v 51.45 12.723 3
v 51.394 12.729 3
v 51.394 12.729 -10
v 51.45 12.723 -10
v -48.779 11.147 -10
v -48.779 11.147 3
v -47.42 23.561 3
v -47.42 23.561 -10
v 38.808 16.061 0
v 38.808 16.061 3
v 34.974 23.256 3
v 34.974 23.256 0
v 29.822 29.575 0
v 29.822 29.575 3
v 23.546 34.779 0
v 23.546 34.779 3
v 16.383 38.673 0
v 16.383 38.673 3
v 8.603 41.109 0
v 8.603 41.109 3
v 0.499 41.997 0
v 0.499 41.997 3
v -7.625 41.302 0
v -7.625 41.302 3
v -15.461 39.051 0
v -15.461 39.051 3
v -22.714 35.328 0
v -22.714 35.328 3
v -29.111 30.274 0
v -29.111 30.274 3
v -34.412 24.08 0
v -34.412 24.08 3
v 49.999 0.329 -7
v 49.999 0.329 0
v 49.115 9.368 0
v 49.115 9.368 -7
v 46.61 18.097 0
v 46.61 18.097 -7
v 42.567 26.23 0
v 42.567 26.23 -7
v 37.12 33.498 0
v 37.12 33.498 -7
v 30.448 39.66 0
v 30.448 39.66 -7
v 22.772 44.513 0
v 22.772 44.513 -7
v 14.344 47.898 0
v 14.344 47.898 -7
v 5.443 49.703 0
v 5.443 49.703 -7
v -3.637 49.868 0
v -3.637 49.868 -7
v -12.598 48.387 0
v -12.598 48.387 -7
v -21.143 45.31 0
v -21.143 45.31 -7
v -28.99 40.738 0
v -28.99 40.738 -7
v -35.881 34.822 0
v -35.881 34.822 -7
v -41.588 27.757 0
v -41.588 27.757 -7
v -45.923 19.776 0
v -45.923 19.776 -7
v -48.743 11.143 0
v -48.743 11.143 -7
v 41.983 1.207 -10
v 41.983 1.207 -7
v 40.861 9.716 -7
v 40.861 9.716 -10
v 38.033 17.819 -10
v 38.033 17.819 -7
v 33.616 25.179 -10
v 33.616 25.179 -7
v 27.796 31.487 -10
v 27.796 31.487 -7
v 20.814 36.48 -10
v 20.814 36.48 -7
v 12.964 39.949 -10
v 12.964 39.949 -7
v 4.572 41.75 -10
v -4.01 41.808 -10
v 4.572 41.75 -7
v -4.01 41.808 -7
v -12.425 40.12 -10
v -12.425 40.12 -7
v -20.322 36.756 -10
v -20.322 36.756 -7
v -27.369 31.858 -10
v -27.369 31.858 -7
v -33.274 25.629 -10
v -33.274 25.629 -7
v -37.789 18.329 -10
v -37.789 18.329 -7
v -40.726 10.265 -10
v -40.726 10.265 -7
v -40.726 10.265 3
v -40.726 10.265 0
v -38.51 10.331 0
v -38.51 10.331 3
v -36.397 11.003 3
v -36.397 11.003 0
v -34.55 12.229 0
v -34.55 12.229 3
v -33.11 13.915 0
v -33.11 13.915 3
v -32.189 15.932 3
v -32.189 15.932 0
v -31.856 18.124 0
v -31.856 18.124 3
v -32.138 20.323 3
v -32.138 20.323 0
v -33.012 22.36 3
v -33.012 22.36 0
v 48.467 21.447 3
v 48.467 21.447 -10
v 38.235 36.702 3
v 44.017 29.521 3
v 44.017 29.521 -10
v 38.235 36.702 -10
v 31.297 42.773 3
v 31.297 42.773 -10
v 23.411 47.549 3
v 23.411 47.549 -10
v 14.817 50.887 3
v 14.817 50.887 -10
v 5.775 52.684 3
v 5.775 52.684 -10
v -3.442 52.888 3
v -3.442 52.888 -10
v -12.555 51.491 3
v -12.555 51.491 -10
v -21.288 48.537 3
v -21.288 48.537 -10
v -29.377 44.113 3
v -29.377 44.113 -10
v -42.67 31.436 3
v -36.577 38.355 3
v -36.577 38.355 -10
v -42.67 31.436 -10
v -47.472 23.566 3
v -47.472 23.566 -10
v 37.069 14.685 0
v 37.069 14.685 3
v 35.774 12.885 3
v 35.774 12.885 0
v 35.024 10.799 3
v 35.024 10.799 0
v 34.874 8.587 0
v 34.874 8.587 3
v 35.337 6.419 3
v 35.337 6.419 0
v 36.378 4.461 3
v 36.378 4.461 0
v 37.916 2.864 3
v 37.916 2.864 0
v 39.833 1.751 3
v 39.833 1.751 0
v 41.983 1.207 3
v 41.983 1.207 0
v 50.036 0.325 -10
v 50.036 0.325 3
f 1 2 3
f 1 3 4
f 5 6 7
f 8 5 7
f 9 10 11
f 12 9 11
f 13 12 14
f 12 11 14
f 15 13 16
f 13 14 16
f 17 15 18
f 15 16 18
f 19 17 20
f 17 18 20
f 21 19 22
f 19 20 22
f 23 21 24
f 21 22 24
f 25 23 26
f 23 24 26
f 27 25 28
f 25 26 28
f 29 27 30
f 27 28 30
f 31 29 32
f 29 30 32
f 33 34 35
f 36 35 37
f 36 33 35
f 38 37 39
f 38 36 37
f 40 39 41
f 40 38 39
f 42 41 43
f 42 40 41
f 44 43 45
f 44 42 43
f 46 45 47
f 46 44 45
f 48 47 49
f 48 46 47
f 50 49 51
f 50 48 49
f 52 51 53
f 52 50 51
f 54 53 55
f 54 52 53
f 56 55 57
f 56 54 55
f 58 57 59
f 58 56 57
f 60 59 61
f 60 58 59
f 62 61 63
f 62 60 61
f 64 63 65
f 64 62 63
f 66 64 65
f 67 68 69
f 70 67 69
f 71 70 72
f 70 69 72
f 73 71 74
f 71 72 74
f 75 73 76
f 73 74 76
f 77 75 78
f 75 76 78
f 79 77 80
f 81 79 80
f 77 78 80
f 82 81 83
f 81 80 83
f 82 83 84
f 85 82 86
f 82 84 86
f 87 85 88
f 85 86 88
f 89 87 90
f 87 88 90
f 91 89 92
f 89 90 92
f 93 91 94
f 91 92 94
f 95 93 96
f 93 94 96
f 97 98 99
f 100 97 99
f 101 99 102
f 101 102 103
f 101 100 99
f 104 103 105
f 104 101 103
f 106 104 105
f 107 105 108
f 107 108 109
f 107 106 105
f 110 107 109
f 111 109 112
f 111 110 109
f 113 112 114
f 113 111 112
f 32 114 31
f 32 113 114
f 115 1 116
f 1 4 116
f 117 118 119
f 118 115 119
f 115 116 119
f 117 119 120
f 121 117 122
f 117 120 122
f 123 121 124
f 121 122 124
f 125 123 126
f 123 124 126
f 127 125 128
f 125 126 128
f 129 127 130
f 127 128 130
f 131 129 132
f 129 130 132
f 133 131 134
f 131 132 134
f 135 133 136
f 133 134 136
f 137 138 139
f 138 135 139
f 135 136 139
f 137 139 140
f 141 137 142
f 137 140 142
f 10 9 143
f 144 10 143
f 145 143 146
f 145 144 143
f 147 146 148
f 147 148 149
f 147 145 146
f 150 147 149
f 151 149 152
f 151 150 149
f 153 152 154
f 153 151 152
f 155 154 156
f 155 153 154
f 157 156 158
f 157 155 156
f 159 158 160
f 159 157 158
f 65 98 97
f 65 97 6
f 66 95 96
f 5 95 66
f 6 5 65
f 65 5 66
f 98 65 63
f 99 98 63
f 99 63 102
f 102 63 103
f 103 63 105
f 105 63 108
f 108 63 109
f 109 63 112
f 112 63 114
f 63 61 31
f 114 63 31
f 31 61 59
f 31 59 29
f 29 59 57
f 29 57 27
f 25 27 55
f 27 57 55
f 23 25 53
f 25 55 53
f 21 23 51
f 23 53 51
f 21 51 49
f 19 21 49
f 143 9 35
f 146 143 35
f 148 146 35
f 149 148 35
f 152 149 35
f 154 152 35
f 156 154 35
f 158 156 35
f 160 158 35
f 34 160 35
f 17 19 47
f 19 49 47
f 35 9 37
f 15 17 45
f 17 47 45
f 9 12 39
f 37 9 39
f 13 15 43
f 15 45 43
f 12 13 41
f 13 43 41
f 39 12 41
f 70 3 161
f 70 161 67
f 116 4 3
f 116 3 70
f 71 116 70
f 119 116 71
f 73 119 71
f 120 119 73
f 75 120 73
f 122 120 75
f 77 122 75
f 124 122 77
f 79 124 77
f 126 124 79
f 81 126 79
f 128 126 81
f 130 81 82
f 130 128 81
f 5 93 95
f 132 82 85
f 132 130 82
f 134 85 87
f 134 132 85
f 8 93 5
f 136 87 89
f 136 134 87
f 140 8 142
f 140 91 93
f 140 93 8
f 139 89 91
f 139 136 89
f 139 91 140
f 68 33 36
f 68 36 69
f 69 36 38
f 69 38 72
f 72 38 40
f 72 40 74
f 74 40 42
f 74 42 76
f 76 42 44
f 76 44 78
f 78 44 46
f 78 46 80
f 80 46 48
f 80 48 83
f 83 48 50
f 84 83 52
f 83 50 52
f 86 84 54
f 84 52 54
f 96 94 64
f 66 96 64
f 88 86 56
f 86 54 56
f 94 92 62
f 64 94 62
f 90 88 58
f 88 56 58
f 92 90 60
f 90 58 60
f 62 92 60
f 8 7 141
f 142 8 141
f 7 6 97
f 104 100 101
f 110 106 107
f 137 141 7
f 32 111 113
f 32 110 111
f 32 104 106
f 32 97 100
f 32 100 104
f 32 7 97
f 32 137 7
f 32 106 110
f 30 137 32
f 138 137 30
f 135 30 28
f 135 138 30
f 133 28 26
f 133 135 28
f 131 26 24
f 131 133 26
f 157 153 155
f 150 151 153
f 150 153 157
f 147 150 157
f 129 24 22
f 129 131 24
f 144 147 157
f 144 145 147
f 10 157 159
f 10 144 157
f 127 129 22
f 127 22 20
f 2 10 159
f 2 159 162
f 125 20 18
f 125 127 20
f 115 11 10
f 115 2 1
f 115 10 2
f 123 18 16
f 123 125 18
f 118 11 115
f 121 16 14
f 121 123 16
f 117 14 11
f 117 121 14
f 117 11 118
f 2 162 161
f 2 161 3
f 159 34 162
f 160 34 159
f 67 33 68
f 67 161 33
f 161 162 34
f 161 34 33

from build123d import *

# Parameters (mm, degrees)
SKETCH1_W                    = 50
SKETCH1_H                    = 7
REVOLVE5_ANGLE               = 167.5
SHELL2_T                     = 3
CUT_EXTRUDE3_DEPTH           = 77.072333999
CUT_EXTRUDE3_DEPTH_BACK      = 10
CUT_EXTRUDE4_DEPTH           = 77.072333999
CUT_EXTRUDE4_DEPTH_BACK      = 10
CUT_EXTRUDE_THIN1_DEPTH      = 77.072333999
CUT_EXTRUDE_THIN1_DEPTH_BACK = 20
CUT_EXTRUDE_THIN2_DEPTH      = 77.072333999
CUT_EXTRUDE_THIN2_DEPTH_BACK = 20
CUT_EXTRUDE_THIN3_DEPTH      = 76.000787866
CUT_EXTRUDE_THIN3_DEPTH_BACK = 20
SKETCH18_R                   = 8
BOSS_EXTRUDE3_DEPTH          = 3


with BuildPart() as part:
    # Sketch1 → Revolve5 (revolve)
    with BuildSketch(Plane(origin=(0, 0, 0), x_dir=(1, 0, 0), z_dir=(0, 1, 0))):
        with Locations((25, 3.5)):
            Rectangle(SKETCH1_W, SKETCH1_H)
    revolve(axis=Axis((0, 0, 0), (0, 0, 1)), revolution_arc=REVOLVE5_ANGLE)

    # Shell2
    shell2_openings = [part.faces().sort_by_distance(p)[0] for p in [
        (25, 0, -3.5),
        (-24.407400178, 5.410990348, -3.5),
    ]]
    offset(amount=SHELL2_T, openings=shell2_openings, kind=Kind.INTERSECTION)

    # Sketch11 → Cut-Extrude3 (cut, two sides: drawn at the far end of the back side and taken through both)
    with BuildSketch(Plane.XY.offset(3).offset(-CUT_EXTRUDE3_DEPTH_BACK)):
        Polygon((-295.067343662, 38.119573796), (-51.743688377, 11.471299539), (53, 0), (296.323655284, -26.648274258), (243.027106769, -513.295584826), (-348.363892177, -448.527736772), align=None)
    extrude(amount=CUT_EXTRUDE3_DEPTH + CUT_EXTRUDE3_DEPTH_BACK, mode=Mode.SUBTRACT)

    # Sketch12 → Cut-Extrude4 (cut, two sides: drawn at the far end of the back side and taken through both)
    with BuildSketch(Plane(origin=(0, 0, -10), x_dir=(-1, 0, 0), z_dir=(0, 0, -1)).offset(-CUT_EXTRUDE4_DEPTH_BACK)):
        Polygon((-296.323655284, -26.648274258), (-53, 0), (51.743688377, 11.471299539), (295.067343662, 38.119573796), (348.363892177, -448.527736772), (-243.027106769, -513.295584826), align=None)
    extrude(amount=CUT_EXTRUDE4_DEPTH + CUT_EXTRUDE4_DEPTH_BACK, mode=Mode.SUBTRACT)

    # Sketch13 → Cut-Extrude-Thin1 (cut, two sides: drawn at the far end of the back side and taken through both)
    with BuildSketch(Plane(origin=(0, 0, -10), x_dir=(-1, 0, 0), z_dir=(0, 0, -1)).offset(-CUT_EXTRUDE_THIN1_DEPTH_BACK)):
        Polygon((48.779244367, 11.146640118), (47.419699991, 23.560551191), (57.360263374, 24.64921994), (58.719807749, 12.235308866), align=None)
    extrude(amount=CUT_EXTRUDE_THIN1_DEPTH + CUT_EXTRUDE_THIN1_DEPTH_BACK, mode=Mode.SUBTRACT)

    # Sketch14 → Cut-Extrude-Thin2 (cut, two sides: drawn at the far end of the back side and taken through both)
    with BuildSketch(Plane(origin=(0, 0, -10), x_dir=(-1, 0, 0), z_dir=(0, 0, -1)).offset(-CUT_EXTRUDE_THIN2_DEPTH_BACK)):
        Polygon((-50.035555989, 0.324659421), (-51.39409796, 12.729417605), (-81.215788107, 9.46341136), (-79.857246136, -2.941346825), align=None)
    extrude(amount=CUT_EXTRUDE_THIN2_DEPTH + CUT_EXTRUDE_THIN2_DEPTH_BACK, mode=Mode.SUBTRACT)

    # Sketch15 → Cut-Extrude-Thin3 (cut, two sides: drawn at the far end of the back side and taken through both)
    with BuildSketch(Plane(origin=(0, 0, -10), x_dir=(-1, 0, 0), z_dir=(0, 0, -1)).offset(-CUT_EXTRUDE_THIN3_DEPTH_BACK)):
        with BuildLine():
            ThreePointArc((-41.982664634, 1.20659446), (-4.572408744, 41.750366205), (40.726353012, 10.264705079))
            Line((40.726353012, 10.264705079), (11.636100861, 2.93277288))
            ThreePointArc((11.636100861, 2.93277288), (-1.306402498, 11.928676059), (-11.995047038, 0.344741274))
            Line((-11.995047038, 0.344741274), (-41.982664634, 1.20659446))
        make_face()
    extrude(amount=CUT_EXTRUDE_THIN3_DEPTH + CUT_EXTRUDE_THIN3_DEPTH_BACK, mode=Mode.SUBTRACT)


with BuildPart() as body_2:
    # of the pieces the cut leaves, the one that is kept (cut_extrude_thin3_keep)
    add(part.part.solids().sort_by_distance((49.998919737, 0.328671743, 0))[0])

    # Sketch18 → Boss-Extrude3 (add)
    with BuildSketch(Plane.XY.offset(3)):
        with Locations((-39.855418013, 18.217155785)):
            Circle(SKETCH18_R)
        with Locations((42.853599633, 9.159045166)):
            Circle(SKETCH18_R)
    extrude(amount=-BOSS_EXTRUDE3_DEPTH)


solid = body_2.part
